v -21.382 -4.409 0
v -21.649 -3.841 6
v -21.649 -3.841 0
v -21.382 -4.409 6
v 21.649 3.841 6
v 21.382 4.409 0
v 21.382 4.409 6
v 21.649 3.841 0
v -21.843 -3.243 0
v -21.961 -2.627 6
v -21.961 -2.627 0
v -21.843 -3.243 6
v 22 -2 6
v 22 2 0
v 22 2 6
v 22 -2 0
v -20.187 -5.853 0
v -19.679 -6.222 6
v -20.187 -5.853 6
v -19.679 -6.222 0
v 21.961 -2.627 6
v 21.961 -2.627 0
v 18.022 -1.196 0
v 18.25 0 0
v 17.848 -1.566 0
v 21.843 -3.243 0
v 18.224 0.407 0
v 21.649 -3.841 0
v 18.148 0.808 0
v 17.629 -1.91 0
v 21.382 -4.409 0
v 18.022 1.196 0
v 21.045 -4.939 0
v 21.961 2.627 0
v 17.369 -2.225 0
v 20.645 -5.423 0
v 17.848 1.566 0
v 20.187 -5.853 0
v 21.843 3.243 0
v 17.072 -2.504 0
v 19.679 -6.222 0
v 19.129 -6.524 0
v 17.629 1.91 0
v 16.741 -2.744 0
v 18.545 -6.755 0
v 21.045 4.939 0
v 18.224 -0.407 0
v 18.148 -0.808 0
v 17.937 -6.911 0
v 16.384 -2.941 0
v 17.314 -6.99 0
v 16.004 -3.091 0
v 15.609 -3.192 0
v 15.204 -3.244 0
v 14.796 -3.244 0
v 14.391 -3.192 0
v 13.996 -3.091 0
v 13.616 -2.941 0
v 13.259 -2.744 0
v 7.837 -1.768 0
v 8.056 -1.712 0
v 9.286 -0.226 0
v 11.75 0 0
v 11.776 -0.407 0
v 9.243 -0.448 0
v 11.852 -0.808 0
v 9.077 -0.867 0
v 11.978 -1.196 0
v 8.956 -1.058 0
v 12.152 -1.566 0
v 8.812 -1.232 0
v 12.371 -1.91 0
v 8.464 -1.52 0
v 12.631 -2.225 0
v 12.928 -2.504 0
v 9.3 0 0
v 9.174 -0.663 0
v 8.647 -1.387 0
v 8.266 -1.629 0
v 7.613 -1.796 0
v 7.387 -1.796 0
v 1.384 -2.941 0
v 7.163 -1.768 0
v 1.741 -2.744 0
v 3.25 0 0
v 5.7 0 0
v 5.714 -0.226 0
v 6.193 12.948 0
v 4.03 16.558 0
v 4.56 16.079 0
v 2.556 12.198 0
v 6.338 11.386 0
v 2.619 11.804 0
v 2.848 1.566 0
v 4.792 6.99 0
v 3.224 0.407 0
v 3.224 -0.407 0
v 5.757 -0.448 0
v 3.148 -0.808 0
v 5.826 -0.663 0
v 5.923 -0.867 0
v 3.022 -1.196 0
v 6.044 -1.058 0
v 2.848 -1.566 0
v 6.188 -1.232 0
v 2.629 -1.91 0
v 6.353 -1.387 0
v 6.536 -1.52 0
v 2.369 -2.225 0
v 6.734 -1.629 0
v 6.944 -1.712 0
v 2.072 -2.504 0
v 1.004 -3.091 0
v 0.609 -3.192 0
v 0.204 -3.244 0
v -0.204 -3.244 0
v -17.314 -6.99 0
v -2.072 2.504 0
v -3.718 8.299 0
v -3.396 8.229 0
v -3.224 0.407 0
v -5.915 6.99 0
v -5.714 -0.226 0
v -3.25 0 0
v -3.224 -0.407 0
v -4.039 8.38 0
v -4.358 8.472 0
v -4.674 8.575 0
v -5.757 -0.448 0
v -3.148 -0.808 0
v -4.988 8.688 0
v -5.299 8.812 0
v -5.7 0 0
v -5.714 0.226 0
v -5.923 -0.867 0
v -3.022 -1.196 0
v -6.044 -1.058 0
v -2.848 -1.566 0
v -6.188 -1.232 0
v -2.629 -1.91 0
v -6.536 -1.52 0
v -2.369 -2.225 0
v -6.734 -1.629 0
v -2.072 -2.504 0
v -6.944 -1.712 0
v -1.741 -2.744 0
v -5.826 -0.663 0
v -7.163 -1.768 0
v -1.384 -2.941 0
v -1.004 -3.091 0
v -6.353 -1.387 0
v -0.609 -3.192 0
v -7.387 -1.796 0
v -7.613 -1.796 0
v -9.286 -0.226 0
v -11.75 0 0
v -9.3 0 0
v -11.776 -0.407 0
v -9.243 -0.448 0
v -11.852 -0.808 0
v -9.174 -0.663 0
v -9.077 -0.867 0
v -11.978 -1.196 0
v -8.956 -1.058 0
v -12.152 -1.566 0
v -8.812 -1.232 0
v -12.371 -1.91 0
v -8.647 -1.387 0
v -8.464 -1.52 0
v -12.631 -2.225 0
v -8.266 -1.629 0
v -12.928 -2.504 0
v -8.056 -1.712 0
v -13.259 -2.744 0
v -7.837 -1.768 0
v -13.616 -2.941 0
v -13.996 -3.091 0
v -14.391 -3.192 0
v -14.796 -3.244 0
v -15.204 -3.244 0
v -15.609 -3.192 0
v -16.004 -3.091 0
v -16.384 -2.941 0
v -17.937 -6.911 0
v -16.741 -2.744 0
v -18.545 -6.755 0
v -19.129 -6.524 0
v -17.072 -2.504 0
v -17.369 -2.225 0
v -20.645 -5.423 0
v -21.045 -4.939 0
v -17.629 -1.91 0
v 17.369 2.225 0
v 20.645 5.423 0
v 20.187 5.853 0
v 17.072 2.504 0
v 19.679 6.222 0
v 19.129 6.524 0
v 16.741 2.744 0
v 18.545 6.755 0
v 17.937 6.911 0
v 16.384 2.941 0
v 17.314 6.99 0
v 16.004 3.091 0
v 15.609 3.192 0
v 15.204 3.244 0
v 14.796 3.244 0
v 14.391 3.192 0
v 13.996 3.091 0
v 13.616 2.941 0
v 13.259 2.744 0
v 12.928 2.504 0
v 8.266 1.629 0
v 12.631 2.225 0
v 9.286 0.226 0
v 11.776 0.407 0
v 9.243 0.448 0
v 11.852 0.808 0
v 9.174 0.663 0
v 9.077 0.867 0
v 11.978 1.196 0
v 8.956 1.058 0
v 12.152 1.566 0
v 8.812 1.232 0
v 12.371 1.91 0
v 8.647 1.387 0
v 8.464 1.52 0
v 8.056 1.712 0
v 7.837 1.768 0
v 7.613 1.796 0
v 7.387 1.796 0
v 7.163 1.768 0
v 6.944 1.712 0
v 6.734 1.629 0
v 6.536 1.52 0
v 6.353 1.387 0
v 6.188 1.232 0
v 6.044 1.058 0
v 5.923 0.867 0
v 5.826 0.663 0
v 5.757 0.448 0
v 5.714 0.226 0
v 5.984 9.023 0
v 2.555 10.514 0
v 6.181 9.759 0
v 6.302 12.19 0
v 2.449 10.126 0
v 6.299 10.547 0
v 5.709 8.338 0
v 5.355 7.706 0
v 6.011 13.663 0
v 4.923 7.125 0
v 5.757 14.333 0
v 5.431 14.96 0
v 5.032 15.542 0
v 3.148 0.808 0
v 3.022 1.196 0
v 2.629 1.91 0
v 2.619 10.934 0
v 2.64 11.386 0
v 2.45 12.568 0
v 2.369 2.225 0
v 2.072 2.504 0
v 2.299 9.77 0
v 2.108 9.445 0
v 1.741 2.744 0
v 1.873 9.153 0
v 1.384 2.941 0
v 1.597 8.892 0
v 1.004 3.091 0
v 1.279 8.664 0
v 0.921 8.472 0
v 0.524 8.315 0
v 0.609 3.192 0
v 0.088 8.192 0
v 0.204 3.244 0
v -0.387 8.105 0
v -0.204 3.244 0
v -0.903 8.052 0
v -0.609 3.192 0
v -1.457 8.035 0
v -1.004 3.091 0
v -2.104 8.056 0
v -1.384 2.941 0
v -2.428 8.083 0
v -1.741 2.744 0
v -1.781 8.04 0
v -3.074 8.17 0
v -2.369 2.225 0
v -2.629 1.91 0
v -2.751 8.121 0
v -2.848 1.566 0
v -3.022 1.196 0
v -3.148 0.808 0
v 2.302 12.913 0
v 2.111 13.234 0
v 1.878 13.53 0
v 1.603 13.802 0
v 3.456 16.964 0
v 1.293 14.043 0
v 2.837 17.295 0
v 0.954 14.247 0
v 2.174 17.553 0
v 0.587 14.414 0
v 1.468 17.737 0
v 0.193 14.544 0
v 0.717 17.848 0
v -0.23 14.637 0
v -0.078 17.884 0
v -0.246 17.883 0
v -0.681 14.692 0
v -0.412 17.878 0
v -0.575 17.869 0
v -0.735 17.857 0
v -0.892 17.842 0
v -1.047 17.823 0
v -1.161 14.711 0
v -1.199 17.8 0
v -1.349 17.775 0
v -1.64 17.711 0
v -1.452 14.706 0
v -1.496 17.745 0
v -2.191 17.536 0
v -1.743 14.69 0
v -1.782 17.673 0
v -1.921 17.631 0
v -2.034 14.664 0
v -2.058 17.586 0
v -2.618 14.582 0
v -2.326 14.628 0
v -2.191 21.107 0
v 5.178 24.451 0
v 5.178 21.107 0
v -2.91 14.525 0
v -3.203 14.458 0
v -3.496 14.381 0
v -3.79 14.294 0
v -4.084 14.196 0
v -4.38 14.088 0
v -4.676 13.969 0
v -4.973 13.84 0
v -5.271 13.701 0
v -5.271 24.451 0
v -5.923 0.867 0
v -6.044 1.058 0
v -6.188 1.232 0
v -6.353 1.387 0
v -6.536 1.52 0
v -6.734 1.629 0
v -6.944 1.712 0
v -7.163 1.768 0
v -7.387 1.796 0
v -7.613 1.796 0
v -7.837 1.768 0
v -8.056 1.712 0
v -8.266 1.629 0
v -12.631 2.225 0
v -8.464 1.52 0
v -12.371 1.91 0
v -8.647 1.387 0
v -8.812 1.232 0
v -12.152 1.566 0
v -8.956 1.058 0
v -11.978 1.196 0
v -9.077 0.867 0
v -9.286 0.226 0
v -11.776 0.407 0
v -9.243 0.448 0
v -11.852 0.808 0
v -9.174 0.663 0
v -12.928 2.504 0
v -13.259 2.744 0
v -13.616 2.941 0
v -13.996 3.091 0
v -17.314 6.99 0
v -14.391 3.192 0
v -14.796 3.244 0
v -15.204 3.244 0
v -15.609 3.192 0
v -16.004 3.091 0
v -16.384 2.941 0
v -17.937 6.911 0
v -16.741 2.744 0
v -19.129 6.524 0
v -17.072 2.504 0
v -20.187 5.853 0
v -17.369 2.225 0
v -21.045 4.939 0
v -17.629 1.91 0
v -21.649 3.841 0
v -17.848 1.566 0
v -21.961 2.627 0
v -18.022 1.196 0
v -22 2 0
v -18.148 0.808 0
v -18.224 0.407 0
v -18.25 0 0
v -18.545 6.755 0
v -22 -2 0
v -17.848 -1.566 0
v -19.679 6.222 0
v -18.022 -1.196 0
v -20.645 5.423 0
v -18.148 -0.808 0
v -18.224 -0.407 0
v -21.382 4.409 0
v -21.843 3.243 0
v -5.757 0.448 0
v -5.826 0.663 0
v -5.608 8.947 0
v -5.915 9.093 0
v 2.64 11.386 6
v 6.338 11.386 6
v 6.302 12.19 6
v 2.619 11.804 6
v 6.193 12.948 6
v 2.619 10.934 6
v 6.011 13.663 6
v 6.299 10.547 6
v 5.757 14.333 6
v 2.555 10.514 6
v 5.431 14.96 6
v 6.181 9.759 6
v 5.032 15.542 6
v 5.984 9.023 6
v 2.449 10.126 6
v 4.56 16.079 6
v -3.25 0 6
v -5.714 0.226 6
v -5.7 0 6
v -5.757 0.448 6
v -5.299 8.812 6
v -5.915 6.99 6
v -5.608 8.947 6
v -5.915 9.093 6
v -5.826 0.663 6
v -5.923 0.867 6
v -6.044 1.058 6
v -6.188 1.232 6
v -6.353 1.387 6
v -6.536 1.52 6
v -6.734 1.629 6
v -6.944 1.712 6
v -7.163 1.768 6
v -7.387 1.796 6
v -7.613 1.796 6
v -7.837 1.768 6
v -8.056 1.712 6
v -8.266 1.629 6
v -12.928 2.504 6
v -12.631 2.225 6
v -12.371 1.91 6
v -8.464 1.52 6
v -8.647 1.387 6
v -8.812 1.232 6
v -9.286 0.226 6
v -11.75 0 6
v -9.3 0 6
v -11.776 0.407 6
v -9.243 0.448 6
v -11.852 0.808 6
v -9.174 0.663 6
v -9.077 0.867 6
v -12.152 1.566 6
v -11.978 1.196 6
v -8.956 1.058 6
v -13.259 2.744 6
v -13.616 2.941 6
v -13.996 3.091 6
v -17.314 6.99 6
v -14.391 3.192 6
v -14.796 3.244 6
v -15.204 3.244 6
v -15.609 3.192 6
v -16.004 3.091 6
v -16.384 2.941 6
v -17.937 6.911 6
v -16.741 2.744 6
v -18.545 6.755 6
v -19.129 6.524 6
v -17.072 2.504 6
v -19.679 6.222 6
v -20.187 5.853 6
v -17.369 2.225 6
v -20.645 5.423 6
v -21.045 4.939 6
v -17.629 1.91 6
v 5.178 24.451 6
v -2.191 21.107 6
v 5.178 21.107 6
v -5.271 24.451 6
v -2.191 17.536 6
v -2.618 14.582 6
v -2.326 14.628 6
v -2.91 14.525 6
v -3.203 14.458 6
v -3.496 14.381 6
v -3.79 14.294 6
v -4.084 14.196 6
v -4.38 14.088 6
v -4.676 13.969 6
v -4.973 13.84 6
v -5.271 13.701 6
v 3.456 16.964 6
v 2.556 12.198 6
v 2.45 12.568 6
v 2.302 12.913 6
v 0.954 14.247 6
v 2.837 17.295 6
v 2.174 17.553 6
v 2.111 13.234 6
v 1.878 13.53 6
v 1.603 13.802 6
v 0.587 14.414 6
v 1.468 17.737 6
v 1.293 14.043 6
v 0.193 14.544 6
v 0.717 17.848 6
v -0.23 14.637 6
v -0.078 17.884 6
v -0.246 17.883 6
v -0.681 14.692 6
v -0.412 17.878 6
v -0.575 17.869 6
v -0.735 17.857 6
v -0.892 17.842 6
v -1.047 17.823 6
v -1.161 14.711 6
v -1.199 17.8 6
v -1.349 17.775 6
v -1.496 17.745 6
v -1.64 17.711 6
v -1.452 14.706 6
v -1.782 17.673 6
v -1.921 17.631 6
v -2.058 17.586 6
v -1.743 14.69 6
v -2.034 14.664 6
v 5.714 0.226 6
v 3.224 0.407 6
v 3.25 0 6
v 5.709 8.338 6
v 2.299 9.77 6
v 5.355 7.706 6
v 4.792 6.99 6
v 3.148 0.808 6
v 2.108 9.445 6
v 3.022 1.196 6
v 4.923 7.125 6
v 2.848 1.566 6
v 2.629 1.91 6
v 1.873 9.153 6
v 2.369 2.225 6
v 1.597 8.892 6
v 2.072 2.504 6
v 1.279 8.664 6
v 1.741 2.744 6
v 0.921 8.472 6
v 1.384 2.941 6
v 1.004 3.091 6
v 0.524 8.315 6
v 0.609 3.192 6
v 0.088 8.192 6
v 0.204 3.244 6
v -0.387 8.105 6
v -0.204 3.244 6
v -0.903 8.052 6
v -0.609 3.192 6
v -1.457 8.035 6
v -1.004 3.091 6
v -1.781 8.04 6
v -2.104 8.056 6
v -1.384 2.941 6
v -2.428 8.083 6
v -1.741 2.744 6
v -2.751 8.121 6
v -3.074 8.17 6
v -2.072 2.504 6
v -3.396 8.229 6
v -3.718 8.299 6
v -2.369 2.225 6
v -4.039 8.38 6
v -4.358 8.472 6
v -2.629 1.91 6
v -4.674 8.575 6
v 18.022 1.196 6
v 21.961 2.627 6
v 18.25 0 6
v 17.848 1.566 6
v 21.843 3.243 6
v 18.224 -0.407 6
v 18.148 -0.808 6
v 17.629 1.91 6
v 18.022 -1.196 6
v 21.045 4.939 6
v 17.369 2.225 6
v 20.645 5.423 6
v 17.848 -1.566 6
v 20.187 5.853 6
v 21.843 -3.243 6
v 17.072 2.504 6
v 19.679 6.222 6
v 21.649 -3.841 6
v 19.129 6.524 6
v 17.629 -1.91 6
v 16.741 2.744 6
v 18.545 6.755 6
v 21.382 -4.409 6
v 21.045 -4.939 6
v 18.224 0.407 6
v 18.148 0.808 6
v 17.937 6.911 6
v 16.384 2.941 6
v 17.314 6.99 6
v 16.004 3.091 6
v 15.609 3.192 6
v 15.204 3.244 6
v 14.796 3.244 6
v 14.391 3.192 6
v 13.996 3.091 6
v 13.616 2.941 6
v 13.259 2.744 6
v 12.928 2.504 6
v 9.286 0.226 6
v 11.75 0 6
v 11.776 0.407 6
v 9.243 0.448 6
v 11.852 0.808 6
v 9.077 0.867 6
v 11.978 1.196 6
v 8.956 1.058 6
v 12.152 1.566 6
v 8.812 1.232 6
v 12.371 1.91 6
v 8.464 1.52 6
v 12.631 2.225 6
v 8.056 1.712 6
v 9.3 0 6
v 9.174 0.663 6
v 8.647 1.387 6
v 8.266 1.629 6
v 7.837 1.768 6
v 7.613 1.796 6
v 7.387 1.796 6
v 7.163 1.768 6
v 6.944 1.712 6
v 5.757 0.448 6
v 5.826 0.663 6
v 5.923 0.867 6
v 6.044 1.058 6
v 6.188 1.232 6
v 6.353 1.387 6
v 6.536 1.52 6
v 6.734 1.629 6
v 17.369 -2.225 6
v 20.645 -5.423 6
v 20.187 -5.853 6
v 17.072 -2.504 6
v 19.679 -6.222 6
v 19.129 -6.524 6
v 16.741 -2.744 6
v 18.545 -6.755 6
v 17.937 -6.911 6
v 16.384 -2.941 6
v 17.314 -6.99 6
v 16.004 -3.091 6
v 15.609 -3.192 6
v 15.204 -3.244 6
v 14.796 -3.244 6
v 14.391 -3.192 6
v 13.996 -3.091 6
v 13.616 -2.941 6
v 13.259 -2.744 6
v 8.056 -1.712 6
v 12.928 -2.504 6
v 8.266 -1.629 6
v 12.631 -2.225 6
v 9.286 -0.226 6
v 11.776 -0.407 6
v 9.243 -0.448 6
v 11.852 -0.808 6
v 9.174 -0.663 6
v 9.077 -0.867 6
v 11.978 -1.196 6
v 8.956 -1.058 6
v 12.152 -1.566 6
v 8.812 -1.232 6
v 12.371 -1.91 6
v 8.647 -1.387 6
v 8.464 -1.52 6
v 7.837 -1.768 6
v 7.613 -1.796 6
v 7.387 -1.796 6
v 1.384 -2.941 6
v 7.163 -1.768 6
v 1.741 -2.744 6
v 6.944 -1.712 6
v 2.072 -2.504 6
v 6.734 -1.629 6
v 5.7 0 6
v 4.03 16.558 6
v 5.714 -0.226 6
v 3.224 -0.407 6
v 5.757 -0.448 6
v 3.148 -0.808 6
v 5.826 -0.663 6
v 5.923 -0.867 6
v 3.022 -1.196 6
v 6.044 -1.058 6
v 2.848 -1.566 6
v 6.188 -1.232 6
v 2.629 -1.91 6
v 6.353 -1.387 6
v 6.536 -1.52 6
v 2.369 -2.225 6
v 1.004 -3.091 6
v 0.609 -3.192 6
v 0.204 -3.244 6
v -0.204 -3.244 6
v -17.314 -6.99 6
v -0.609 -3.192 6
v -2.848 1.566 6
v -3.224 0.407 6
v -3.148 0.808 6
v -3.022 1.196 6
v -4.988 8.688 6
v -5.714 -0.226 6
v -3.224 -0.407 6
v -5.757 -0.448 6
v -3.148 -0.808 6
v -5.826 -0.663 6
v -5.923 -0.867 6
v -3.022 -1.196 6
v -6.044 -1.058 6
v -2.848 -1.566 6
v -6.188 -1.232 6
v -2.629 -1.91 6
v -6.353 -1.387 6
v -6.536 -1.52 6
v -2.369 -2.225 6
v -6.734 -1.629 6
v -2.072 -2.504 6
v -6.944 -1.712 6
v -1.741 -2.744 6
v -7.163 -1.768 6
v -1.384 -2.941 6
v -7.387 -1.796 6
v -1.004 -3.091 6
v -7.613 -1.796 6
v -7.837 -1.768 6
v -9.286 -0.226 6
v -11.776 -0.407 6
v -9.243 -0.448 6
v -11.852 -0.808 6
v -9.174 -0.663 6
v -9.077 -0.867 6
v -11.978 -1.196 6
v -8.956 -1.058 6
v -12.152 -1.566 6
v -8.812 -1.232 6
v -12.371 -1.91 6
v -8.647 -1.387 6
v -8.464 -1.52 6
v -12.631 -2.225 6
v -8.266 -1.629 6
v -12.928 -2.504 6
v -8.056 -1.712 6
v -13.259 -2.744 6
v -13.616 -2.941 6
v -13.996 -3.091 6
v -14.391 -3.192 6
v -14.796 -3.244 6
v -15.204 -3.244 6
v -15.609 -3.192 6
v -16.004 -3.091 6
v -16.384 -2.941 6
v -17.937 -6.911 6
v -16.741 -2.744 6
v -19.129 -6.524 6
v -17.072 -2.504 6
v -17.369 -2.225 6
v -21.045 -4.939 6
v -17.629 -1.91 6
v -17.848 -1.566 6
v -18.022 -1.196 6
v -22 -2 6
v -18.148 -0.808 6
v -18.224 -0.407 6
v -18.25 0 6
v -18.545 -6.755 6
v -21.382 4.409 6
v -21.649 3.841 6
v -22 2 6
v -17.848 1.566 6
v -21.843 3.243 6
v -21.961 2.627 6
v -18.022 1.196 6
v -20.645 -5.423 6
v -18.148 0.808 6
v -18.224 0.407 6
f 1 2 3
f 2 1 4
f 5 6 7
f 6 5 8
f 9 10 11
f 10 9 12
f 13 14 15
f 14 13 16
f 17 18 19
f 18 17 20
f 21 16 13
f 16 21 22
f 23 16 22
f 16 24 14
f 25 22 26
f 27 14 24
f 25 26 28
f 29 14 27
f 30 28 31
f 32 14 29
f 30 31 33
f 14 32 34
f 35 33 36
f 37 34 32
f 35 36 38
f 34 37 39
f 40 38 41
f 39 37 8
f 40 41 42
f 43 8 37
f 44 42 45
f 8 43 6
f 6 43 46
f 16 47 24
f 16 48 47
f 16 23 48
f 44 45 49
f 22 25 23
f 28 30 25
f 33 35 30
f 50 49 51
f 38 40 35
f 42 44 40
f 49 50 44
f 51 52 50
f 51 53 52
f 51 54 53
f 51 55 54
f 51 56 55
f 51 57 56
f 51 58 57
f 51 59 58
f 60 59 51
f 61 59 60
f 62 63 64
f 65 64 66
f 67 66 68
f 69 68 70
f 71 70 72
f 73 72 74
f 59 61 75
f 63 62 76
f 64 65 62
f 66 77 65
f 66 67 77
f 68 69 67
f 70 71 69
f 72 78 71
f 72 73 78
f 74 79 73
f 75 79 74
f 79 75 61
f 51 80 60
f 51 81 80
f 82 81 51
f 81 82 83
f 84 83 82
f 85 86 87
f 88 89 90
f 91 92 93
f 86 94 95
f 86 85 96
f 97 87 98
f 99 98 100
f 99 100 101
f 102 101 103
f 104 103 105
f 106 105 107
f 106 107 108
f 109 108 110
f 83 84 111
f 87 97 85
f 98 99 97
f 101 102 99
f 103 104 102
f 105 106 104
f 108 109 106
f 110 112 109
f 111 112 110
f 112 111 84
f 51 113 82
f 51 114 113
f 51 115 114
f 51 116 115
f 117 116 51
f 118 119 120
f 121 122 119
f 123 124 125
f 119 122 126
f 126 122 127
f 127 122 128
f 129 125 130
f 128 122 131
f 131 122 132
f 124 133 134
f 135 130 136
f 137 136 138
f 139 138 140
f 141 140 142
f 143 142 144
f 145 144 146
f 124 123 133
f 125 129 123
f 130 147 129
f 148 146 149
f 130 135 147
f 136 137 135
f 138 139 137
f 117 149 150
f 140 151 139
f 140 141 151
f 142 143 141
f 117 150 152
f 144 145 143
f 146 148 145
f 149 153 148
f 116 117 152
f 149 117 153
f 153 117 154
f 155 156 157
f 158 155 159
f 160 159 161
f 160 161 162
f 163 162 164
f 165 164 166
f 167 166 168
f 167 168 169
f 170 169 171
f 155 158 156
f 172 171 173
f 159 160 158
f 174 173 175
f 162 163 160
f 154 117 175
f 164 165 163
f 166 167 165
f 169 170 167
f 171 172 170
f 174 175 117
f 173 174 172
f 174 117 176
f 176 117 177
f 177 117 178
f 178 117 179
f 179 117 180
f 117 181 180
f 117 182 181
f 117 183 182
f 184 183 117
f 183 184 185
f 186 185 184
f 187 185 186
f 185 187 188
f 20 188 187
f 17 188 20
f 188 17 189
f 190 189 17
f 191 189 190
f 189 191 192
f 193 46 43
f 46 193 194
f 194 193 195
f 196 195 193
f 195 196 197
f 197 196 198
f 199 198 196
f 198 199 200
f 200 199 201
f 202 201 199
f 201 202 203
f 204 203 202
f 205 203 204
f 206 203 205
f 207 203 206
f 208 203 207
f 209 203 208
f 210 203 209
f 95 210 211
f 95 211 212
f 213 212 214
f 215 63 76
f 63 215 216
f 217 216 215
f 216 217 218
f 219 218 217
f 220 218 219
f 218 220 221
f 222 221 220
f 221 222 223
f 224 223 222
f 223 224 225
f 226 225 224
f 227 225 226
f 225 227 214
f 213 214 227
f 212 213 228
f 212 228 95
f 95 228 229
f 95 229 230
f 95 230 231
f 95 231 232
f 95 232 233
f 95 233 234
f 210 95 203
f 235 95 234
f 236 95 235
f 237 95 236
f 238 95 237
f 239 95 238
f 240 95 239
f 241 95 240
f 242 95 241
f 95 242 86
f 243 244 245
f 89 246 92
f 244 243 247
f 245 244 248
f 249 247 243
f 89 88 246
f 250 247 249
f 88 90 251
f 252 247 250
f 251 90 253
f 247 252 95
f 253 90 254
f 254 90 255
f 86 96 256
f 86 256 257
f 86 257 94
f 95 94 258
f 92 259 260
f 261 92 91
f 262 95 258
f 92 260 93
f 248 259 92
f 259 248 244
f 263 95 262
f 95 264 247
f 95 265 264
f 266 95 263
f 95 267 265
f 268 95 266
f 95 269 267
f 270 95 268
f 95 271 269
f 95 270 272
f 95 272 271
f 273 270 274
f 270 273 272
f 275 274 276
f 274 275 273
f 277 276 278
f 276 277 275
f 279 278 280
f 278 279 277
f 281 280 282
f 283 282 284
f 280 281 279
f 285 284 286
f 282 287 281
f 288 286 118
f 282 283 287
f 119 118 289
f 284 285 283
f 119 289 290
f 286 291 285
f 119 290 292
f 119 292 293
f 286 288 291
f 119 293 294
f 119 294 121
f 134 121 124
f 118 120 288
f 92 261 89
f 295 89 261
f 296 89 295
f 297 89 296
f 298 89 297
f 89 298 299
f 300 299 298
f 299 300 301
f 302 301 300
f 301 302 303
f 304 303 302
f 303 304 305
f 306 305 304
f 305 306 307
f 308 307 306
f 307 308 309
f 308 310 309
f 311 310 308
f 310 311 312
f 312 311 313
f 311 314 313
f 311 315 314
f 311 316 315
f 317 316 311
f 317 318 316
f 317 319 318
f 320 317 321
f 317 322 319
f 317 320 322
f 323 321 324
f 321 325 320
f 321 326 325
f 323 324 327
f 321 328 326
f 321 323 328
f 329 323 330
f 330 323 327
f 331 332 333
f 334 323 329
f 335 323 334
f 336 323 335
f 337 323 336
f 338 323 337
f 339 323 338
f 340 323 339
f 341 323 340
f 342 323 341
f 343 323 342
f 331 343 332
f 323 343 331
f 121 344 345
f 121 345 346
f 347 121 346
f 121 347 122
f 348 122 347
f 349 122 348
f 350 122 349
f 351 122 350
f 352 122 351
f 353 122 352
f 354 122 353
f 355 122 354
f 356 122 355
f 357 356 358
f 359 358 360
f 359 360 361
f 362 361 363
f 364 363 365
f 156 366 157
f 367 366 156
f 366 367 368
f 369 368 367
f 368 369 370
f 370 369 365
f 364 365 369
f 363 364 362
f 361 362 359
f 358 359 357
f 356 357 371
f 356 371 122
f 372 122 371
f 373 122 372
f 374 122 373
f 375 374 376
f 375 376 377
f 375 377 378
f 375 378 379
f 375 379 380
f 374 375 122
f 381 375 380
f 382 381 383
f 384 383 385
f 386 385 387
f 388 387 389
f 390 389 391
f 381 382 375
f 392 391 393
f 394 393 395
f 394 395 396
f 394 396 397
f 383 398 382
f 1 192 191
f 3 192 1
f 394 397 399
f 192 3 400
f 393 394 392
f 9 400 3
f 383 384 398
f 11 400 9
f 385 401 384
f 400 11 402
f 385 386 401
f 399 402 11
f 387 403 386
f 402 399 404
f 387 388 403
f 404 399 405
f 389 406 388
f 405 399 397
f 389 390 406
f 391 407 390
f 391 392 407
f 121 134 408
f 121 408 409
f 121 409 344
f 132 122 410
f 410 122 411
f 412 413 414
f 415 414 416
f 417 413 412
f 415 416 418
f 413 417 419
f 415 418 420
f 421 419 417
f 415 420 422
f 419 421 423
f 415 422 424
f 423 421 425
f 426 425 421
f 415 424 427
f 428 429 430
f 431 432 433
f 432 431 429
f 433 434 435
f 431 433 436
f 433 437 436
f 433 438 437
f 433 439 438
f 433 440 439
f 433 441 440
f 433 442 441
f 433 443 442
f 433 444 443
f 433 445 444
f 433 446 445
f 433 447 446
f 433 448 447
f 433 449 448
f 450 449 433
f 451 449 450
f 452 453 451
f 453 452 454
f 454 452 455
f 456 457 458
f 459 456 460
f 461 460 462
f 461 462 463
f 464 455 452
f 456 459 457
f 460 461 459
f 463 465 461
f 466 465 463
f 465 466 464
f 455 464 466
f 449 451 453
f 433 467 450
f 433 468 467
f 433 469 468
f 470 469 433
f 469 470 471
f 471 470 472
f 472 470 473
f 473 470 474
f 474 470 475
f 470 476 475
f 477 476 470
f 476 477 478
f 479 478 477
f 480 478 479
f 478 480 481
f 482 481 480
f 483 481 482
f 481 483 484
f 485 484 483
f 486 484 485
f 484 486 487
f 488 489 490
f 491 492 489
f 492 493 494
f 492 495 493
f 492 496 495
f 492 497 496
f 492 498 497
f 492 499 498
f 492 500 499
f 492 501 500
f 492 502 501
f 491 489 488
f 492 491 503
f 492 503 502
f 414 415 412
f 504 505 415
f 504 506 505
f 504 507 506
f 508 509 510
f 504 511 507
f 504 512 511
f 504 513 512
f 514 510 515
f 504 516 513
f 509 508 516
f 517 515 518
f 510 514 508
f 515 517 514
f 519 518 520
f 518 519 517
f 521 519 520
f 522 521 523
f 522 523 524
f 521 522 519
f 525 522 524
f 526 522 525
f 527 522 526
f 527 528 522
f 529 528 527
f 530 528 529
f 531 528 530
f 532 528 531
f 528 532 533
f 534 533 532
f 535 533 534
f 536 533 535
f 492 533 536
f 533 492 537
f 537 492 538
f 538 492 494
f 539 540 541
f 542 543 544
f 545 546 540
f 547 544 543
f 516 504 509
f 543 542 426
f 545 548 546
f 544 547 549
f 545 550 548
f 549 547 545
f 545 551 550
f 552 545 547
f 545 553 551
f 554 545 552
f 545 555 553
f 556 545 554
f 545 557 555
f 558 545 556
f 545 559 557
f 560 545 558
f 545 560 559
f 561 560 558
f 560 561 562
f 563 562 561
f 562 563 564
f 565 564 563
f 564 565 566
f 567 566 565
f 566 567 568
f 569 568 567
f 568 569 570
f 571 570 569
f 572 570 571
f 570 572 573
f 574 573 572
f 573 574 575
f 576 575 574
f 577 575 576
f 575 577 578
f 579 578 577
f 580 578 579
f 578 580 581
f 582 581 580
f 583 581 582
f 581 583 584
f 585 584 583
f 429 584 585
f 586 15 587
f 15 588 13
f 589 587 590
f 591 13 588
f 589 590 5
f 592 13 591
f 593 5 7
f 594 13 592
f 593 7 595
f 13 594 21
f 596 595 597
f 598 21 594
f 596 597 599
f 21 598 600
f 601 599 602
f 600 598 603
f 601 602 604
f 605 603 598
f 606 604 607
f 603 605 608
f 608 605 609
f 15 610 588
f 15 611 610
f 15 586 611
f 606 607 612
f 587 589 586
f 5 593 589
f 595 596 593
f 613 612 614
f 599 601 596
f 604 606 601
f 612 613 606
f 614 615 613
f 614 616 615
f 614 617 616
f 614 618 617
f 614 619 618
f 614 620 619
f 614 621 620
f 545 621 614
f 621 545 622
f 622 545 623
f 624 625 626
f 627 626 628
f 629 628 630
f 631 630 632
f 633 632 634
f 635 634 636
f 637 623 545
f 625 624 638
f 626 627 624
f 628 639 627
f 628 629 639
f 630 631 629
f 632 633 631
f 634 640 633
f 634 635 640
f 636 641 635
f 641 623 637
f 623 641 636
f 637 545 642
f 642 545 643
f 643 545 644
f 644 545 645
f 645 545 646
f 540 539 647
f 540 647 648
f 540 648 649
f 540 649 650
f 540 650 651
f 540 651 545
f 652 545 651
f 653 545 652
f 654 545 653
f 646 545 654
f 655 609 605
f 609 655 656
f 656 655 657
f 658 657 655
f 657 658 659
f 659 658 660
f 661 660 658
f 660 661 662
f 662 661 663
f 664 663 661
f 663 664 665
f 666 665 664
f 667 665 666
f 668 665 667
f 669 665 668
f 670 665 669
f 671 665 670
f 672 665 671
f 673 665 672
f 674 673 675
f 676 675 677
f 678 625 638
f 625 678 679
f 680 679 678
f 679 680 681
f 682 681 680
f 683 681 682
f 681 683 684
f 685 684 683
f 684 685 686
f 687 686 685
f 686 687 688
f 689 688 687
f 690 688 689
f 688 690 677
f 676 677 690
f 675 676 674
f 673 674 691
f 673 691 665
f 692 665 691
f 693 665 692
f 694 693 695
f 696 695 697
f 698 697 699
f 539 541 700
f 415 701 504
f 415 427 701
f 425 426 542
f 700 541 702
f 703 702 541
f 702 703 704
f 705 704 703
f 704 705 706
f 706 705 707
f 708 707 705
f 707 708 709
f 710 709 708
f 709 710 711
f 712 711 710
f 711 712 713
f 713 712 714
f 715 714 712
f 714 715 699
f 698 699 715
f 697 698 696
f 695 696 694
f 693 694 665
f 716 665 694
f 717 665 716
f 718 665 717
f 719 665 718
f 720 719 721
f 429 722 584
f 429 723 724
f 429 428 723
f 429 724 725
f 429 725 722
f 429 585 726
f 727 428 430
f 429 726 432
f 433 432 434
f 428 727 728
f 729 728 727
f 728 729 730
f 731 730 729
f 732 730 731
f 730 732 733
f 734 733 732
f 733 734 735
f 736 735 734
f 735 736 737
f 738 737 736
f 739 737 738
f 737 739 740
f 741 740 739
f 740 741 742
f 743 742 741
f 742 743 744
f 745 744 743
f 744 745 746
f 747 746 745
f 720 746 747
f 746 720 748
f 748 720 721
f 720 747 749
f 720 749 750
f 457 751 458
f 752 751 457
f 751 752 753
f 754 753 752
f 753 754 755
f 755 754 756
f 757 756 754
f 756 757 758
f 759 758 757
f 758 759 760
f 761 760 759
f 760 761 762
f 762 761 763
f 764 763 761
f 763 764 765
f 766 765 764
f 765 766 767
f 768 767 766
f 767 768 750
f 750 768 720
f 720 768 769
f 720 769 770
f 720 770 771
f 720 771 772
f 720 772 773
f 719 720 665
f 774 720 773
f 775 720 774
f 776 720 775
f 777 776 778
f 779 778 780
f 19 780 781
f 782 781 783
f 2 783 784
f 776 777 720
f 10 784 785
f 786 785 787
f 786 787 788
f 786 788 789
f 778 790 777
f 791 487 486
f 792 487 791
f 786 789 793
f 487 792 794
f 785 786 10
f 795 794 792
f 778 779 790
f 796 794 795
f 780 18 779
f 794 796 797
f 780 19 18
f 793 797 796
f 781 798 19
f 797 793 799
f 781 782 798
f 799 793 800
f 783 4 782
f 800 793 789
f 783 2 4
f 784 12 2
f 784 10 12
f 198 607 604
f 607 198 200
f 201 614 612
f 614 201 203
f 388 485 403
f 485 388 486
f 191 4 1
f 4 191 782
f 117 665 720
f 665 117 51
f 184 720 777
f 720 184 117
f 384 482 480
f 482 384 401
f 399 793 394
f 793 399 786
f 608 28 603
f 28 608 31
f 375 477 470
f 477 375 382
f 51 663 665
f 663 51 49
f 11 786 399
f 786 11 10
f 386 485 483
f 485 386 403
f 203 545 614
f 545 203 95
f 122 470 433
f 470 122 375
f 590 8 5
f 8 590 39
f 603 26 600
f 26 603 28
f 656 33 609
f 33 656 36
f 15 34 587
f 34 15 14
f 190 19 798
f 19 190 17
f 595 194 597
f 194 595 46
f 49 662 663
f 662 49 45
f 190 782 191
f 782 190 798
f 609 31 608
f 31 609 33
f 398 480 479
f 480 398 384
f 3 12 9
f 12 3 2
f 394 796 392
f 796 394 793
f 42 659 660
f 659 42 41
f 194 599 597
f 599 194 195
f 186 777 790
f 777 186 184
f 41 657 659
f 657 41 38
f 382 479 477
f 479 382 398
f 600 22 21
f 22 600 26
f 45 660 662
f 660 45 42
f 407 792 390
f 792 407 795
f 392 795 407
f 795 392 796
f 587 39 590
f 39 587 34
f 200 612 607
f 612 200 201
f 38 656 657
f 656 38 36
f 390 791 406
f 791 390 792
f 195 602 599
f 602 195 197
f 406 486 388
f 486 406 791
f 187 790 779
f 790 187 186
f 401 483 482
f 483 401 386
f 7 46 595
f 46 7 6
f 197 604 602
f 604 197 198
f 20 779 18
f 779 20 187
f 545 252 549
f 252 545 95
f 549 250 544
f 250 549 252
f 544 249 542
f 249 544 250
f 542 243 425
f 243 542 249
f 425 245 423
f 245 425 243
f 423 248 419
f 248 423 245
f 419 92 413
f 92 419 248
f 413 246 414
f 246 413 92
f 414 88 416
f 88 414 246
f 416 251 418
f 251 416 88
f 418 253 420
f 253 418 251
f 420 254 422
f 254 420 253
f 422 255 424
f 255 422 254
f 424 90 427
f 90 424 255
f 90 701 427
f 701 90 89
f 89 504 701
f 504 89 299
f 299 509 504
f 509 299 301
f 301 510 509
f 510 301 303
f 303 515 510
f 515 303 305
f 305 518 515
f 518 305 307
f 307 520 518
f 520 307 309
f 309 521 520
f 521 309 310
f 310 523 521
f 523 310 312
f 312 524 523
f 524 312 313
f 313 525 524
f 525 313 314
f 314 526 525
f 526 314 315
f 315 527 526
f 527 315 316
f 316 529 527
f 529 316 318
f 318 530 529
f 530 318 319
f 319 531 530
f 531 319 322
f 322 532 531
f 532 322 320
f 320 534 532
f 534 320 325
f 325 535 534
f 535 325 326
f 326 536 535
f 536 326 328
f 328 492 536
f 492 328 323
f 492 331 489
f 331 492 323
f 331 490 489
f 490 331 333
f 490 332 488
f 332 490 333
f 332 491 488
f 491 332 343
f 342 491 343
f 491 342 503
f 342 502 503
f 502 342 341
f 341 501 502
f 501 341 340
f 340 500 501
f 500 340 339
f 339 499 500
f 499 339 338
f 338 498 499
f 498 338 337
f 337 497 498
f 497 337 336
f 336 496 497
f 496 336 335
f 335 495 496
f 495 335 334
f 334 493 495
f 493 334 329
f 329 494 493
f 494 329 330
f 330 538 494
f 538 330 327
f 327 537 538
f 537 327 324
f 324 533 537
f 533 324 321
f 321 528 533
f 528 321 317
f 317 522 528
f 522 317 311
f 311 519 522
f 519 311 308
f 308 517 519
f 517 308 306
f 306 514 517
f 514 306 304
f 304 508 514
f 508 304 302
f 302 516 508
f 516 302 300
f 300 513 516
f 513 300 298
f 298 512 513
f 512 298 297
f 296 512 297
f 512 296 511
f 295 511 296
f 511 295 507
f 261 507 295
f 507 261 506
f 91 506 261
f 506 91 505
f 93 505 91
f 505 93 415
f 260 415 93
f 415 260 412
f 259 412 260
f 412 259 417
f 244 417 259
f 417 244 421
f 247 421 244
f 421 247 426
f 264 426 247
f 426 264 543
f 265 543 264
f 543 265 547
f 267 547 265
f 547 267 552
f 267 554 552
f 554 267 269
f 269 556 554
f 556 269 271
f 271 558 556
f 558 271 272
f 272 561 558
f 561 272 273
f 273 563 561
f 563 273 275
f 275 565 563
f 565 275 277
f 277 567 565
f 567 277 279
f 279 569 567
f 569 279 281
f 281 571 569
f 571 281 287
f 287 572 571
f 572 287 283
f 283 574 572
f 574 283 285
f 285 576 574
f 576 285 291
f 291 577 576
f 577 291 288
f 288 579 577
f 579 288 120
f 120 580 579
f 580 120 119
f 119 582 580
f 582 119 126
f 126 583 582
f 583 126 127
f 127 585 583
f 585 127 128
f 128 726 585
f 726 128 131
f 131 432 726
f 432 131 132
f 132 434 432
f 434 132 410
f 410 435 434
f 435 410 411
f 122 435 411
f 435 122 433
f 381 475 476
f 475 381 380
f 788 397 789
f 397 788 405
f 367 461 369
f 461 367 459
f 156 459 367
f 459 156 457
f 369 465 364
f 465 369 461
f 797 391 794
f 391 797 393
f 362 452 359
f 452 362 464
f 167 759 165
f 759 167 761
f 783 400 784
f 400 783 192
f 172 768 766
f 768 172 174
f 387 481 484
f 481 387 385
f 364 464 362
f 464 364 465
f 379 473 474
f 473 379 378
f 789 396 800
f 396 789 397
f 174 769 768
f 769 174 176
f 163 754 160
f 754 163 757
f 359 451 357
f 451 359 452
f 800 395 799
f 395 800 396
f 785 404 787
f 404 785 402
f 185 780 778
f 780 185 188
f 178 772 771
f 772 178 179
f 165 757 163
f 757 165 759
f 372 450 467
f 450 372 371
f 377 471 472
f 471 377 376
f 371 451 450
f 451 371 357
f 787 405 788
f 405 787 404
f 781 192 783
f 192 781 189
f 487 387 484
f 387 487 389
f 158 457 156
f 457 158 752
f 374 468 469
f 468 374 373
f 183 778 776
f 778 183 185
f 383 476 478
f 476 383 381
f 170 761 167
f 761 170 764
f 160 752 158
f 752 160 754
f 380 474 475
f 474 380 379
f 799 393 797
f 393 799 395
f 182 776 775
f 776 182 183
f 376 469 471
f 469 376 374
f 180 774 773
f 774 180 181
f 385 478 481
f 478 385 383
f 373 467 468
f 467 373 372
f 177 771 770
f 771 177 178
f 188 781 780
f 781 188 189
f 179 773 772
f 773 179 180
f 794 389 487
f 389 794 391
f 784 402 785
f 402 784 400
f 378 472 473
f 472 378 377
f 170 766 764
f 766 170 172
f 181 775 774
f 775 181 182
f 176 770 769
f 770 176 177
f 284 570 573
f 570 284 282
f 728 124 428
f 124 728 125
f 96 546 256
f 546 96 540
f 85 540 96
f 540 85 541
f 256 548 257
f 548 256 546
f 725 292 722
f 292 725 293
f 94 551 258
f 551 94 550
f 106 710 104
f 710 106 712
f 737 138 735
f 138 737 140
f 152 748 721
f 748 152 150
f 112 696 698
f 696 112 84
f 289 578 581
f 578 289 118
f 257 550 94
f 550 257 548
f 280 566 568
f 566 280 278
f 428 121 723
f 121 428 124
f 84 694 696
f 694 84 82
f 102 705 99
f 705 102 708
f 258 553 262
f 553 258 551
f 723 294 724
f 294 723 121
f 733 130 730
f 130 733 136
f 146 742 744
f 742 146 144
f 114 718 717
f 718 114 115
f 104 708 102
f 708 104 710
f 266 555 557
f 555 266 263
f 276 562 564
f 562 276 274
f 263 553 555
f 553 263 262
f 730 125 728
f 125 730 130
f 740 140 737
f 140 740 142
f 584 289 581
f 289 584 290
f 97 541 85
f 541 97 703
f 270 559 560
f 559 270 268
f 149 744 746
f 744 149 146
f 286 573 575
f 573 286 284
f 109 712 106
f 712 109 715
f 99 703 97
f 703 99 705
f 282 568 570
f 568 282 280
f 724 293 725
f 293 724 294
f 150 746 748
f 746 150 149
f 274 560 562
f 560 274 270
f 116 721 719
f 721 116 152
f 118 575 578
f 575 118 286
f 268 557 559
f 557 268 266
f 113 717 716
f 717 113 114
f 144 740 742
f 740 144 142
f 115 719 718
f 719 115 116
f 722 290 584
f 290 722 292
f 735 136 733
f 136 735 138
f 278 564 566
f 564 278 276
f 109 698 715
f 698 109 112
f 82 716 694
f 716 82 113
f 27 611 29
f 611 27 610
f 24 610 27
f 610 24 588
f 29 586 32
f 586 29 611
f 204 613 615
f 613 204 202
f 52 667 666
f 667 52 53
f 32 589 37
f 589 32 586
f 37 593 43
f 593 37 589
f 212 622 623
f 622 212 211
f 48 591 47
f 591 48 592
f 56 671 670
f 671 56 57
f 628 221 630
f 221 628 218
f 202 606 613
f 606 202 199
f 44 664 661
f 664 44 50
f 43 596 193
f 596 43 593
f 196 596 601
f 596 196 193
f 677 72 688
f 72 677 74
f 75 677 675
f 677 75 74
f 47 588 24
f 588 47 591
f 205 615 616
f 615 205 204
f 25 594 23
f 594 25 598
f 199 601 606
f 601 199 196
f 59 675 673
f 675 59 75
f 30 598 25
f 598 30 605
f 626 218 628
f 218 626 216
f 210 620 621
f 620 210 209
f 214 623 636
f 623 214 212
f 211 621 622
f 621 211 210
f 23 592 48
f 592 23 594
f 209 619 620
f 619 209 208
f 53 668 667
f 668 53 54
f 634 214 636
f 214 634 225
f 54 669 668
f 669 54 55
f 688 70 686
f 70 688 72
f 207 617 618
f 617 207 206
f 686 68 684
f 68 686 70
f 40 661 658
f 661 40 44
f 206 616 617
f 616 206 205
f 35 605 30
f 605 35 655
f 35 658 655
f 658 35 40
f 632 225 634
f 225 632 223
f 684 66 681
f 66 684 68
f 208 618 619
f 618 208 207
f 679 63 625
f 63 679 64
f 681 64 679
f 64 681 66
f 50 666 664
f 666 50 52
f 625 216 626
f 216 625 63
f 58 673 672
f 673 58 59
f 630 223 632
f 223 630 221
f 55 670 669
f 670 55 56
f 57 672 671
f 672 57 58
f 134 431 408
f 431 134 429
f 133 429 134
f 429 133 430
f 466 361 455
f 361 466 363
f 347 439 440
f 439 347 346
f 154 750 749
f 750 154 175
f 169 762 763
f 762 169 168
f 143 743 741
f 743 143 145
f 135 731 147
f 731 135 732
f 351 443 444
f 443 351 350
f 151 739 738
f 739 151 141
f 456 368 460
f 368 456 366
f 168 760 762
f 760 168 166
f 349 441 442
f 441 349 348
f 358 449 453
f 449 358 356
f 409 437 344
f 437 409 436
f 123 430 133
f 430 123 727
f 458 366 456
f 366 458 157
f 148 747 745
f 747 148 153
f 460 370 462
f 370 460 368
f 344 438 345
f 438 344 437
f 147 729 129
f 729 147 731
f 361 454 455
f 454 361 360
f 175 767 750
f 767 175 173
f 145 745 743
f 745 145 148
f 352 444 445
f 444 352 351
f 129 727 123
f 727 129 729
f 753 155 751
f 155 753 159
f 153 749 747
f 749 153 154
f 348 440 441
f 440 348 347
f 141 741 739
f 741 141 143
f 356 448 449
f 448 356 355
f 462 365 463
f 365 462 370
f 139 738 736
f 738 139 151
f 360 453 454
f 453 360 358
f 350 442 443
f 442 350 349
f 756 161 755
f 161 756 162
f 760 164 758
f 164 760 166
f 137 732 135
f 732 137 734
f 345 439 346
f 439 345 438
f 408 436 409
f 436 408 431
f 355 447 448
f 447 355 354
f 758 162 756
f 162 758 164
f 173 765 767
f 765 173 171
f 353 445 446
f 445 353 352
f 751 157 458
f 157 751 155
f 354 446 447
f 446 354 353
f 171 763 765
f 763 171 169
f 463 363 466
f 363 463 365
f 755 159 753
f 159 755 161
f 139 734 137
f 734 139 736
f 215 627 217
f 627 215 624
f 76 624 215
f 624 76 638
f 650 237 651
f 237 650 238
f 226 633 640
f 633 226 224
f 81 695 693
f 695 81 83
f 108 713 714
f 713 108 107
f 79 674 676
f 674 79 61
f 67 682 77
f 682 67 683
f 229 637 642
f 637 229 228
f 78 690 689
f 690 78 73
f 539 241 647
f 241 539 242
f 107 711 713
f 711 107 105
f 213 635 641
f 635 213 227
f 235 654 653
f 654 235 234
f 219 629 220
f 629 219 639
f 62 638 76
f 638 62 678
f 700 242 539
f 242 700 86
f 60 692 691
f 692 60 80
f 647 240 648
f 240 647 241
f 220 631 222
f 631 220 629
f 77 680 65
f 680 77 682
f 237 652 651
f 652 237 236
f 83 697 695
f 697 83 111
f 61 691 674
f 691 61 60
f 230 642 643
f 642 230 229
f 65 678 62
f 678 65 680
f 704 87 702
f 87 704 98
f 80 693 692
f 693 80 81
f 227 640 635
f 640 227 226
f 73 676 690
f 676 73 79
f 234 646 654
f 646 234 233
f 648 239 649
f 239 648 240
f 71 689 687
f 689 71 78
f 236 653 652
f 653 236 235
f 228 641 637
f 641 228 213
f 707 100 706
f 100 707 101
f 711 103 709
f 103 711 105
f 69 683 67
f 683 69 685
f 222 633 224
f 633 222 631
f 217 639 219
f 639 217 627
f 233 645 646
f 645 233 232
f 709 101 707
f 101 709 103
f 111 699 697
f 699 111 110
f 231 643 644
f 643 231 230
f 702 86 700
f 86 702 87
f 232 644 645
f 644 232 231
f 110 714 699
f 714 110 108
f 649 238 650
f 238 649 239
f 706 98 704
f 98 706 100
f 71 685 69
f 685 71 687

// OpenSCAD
$fn = 50;


difference() {
	union() {
		hull() {
			translate(v = [-17.0000000000, 2.0000000000, 0]) {
				cylinder(h = 6, r = 5);
			}
			translate(v = [17.0000000000, 2.0000000000, 0]) {
				cylinder(h = 6, r = 5);
			}
			translate(v = [-17.0000000000, -2.0000000000, 0]) {
				cylinder(h = 6, r = 5);
			}
			translate(v = [17.0000000000, -2.0000000000, 0]) {
				cylinder(h = 6, r = 5);
			}
		}
		translate(v = [0, 24, 0]) {
			linear_extrude(height = 6) {
				text(font = "DejaVu Sans Mono:style=Bold", halign = "center", size = 19.0000000000, text = "5", valign = "top");
			}
		}
	}
	union() {
		translate(v = [-15.0000000000, 0.0000000000, 0]) {
			translate(v = [0, 0, -100]) {
				cylinder(h = 200, r = 3.2500000000);
			}
		}
		translate(v = [0, 0, -100]) {
			cylinder(h = 200, r = 3.2500000000);
		}
		translate(v = [15.0000000000, 0.0000000000, 0]) {
			translate(v = [0, 0, -100]) {
				cylinder(h = 200, r = 3.2500000000);
			}
		}
		translate(v = [-15.0000000000, 0.0000000000, 0]) {
			translate(v = [0, 0, -100]) {
				cylinder(h = 200, r = 1.8000000000);
			}
		}
		translate(v = [-7.5000000000, 0.0000000000, 0]) {
			translate(v = [0, 0, -100]) {
				cylinder(h = 200, r = 1.8000000000);
			}
		}
		translate(v = [0, 0, -100]) {
			cylinder(h = 200, r = 1.8000000000);
		}
		translate(v = [7.5000000000, 0.0000000000, 0]) {
			translate(v = [0, 0, -100]) {
				cylinder(h = 200, r = 1.8000000000);
			}
		}
		translate(v = [15.0000000000, 0.0000000000, 0]) {
			translate(v = [0, 0, -100]) {
				cylinder(h = 200, r = 1.8000000000);
			}
		}
	}
}
